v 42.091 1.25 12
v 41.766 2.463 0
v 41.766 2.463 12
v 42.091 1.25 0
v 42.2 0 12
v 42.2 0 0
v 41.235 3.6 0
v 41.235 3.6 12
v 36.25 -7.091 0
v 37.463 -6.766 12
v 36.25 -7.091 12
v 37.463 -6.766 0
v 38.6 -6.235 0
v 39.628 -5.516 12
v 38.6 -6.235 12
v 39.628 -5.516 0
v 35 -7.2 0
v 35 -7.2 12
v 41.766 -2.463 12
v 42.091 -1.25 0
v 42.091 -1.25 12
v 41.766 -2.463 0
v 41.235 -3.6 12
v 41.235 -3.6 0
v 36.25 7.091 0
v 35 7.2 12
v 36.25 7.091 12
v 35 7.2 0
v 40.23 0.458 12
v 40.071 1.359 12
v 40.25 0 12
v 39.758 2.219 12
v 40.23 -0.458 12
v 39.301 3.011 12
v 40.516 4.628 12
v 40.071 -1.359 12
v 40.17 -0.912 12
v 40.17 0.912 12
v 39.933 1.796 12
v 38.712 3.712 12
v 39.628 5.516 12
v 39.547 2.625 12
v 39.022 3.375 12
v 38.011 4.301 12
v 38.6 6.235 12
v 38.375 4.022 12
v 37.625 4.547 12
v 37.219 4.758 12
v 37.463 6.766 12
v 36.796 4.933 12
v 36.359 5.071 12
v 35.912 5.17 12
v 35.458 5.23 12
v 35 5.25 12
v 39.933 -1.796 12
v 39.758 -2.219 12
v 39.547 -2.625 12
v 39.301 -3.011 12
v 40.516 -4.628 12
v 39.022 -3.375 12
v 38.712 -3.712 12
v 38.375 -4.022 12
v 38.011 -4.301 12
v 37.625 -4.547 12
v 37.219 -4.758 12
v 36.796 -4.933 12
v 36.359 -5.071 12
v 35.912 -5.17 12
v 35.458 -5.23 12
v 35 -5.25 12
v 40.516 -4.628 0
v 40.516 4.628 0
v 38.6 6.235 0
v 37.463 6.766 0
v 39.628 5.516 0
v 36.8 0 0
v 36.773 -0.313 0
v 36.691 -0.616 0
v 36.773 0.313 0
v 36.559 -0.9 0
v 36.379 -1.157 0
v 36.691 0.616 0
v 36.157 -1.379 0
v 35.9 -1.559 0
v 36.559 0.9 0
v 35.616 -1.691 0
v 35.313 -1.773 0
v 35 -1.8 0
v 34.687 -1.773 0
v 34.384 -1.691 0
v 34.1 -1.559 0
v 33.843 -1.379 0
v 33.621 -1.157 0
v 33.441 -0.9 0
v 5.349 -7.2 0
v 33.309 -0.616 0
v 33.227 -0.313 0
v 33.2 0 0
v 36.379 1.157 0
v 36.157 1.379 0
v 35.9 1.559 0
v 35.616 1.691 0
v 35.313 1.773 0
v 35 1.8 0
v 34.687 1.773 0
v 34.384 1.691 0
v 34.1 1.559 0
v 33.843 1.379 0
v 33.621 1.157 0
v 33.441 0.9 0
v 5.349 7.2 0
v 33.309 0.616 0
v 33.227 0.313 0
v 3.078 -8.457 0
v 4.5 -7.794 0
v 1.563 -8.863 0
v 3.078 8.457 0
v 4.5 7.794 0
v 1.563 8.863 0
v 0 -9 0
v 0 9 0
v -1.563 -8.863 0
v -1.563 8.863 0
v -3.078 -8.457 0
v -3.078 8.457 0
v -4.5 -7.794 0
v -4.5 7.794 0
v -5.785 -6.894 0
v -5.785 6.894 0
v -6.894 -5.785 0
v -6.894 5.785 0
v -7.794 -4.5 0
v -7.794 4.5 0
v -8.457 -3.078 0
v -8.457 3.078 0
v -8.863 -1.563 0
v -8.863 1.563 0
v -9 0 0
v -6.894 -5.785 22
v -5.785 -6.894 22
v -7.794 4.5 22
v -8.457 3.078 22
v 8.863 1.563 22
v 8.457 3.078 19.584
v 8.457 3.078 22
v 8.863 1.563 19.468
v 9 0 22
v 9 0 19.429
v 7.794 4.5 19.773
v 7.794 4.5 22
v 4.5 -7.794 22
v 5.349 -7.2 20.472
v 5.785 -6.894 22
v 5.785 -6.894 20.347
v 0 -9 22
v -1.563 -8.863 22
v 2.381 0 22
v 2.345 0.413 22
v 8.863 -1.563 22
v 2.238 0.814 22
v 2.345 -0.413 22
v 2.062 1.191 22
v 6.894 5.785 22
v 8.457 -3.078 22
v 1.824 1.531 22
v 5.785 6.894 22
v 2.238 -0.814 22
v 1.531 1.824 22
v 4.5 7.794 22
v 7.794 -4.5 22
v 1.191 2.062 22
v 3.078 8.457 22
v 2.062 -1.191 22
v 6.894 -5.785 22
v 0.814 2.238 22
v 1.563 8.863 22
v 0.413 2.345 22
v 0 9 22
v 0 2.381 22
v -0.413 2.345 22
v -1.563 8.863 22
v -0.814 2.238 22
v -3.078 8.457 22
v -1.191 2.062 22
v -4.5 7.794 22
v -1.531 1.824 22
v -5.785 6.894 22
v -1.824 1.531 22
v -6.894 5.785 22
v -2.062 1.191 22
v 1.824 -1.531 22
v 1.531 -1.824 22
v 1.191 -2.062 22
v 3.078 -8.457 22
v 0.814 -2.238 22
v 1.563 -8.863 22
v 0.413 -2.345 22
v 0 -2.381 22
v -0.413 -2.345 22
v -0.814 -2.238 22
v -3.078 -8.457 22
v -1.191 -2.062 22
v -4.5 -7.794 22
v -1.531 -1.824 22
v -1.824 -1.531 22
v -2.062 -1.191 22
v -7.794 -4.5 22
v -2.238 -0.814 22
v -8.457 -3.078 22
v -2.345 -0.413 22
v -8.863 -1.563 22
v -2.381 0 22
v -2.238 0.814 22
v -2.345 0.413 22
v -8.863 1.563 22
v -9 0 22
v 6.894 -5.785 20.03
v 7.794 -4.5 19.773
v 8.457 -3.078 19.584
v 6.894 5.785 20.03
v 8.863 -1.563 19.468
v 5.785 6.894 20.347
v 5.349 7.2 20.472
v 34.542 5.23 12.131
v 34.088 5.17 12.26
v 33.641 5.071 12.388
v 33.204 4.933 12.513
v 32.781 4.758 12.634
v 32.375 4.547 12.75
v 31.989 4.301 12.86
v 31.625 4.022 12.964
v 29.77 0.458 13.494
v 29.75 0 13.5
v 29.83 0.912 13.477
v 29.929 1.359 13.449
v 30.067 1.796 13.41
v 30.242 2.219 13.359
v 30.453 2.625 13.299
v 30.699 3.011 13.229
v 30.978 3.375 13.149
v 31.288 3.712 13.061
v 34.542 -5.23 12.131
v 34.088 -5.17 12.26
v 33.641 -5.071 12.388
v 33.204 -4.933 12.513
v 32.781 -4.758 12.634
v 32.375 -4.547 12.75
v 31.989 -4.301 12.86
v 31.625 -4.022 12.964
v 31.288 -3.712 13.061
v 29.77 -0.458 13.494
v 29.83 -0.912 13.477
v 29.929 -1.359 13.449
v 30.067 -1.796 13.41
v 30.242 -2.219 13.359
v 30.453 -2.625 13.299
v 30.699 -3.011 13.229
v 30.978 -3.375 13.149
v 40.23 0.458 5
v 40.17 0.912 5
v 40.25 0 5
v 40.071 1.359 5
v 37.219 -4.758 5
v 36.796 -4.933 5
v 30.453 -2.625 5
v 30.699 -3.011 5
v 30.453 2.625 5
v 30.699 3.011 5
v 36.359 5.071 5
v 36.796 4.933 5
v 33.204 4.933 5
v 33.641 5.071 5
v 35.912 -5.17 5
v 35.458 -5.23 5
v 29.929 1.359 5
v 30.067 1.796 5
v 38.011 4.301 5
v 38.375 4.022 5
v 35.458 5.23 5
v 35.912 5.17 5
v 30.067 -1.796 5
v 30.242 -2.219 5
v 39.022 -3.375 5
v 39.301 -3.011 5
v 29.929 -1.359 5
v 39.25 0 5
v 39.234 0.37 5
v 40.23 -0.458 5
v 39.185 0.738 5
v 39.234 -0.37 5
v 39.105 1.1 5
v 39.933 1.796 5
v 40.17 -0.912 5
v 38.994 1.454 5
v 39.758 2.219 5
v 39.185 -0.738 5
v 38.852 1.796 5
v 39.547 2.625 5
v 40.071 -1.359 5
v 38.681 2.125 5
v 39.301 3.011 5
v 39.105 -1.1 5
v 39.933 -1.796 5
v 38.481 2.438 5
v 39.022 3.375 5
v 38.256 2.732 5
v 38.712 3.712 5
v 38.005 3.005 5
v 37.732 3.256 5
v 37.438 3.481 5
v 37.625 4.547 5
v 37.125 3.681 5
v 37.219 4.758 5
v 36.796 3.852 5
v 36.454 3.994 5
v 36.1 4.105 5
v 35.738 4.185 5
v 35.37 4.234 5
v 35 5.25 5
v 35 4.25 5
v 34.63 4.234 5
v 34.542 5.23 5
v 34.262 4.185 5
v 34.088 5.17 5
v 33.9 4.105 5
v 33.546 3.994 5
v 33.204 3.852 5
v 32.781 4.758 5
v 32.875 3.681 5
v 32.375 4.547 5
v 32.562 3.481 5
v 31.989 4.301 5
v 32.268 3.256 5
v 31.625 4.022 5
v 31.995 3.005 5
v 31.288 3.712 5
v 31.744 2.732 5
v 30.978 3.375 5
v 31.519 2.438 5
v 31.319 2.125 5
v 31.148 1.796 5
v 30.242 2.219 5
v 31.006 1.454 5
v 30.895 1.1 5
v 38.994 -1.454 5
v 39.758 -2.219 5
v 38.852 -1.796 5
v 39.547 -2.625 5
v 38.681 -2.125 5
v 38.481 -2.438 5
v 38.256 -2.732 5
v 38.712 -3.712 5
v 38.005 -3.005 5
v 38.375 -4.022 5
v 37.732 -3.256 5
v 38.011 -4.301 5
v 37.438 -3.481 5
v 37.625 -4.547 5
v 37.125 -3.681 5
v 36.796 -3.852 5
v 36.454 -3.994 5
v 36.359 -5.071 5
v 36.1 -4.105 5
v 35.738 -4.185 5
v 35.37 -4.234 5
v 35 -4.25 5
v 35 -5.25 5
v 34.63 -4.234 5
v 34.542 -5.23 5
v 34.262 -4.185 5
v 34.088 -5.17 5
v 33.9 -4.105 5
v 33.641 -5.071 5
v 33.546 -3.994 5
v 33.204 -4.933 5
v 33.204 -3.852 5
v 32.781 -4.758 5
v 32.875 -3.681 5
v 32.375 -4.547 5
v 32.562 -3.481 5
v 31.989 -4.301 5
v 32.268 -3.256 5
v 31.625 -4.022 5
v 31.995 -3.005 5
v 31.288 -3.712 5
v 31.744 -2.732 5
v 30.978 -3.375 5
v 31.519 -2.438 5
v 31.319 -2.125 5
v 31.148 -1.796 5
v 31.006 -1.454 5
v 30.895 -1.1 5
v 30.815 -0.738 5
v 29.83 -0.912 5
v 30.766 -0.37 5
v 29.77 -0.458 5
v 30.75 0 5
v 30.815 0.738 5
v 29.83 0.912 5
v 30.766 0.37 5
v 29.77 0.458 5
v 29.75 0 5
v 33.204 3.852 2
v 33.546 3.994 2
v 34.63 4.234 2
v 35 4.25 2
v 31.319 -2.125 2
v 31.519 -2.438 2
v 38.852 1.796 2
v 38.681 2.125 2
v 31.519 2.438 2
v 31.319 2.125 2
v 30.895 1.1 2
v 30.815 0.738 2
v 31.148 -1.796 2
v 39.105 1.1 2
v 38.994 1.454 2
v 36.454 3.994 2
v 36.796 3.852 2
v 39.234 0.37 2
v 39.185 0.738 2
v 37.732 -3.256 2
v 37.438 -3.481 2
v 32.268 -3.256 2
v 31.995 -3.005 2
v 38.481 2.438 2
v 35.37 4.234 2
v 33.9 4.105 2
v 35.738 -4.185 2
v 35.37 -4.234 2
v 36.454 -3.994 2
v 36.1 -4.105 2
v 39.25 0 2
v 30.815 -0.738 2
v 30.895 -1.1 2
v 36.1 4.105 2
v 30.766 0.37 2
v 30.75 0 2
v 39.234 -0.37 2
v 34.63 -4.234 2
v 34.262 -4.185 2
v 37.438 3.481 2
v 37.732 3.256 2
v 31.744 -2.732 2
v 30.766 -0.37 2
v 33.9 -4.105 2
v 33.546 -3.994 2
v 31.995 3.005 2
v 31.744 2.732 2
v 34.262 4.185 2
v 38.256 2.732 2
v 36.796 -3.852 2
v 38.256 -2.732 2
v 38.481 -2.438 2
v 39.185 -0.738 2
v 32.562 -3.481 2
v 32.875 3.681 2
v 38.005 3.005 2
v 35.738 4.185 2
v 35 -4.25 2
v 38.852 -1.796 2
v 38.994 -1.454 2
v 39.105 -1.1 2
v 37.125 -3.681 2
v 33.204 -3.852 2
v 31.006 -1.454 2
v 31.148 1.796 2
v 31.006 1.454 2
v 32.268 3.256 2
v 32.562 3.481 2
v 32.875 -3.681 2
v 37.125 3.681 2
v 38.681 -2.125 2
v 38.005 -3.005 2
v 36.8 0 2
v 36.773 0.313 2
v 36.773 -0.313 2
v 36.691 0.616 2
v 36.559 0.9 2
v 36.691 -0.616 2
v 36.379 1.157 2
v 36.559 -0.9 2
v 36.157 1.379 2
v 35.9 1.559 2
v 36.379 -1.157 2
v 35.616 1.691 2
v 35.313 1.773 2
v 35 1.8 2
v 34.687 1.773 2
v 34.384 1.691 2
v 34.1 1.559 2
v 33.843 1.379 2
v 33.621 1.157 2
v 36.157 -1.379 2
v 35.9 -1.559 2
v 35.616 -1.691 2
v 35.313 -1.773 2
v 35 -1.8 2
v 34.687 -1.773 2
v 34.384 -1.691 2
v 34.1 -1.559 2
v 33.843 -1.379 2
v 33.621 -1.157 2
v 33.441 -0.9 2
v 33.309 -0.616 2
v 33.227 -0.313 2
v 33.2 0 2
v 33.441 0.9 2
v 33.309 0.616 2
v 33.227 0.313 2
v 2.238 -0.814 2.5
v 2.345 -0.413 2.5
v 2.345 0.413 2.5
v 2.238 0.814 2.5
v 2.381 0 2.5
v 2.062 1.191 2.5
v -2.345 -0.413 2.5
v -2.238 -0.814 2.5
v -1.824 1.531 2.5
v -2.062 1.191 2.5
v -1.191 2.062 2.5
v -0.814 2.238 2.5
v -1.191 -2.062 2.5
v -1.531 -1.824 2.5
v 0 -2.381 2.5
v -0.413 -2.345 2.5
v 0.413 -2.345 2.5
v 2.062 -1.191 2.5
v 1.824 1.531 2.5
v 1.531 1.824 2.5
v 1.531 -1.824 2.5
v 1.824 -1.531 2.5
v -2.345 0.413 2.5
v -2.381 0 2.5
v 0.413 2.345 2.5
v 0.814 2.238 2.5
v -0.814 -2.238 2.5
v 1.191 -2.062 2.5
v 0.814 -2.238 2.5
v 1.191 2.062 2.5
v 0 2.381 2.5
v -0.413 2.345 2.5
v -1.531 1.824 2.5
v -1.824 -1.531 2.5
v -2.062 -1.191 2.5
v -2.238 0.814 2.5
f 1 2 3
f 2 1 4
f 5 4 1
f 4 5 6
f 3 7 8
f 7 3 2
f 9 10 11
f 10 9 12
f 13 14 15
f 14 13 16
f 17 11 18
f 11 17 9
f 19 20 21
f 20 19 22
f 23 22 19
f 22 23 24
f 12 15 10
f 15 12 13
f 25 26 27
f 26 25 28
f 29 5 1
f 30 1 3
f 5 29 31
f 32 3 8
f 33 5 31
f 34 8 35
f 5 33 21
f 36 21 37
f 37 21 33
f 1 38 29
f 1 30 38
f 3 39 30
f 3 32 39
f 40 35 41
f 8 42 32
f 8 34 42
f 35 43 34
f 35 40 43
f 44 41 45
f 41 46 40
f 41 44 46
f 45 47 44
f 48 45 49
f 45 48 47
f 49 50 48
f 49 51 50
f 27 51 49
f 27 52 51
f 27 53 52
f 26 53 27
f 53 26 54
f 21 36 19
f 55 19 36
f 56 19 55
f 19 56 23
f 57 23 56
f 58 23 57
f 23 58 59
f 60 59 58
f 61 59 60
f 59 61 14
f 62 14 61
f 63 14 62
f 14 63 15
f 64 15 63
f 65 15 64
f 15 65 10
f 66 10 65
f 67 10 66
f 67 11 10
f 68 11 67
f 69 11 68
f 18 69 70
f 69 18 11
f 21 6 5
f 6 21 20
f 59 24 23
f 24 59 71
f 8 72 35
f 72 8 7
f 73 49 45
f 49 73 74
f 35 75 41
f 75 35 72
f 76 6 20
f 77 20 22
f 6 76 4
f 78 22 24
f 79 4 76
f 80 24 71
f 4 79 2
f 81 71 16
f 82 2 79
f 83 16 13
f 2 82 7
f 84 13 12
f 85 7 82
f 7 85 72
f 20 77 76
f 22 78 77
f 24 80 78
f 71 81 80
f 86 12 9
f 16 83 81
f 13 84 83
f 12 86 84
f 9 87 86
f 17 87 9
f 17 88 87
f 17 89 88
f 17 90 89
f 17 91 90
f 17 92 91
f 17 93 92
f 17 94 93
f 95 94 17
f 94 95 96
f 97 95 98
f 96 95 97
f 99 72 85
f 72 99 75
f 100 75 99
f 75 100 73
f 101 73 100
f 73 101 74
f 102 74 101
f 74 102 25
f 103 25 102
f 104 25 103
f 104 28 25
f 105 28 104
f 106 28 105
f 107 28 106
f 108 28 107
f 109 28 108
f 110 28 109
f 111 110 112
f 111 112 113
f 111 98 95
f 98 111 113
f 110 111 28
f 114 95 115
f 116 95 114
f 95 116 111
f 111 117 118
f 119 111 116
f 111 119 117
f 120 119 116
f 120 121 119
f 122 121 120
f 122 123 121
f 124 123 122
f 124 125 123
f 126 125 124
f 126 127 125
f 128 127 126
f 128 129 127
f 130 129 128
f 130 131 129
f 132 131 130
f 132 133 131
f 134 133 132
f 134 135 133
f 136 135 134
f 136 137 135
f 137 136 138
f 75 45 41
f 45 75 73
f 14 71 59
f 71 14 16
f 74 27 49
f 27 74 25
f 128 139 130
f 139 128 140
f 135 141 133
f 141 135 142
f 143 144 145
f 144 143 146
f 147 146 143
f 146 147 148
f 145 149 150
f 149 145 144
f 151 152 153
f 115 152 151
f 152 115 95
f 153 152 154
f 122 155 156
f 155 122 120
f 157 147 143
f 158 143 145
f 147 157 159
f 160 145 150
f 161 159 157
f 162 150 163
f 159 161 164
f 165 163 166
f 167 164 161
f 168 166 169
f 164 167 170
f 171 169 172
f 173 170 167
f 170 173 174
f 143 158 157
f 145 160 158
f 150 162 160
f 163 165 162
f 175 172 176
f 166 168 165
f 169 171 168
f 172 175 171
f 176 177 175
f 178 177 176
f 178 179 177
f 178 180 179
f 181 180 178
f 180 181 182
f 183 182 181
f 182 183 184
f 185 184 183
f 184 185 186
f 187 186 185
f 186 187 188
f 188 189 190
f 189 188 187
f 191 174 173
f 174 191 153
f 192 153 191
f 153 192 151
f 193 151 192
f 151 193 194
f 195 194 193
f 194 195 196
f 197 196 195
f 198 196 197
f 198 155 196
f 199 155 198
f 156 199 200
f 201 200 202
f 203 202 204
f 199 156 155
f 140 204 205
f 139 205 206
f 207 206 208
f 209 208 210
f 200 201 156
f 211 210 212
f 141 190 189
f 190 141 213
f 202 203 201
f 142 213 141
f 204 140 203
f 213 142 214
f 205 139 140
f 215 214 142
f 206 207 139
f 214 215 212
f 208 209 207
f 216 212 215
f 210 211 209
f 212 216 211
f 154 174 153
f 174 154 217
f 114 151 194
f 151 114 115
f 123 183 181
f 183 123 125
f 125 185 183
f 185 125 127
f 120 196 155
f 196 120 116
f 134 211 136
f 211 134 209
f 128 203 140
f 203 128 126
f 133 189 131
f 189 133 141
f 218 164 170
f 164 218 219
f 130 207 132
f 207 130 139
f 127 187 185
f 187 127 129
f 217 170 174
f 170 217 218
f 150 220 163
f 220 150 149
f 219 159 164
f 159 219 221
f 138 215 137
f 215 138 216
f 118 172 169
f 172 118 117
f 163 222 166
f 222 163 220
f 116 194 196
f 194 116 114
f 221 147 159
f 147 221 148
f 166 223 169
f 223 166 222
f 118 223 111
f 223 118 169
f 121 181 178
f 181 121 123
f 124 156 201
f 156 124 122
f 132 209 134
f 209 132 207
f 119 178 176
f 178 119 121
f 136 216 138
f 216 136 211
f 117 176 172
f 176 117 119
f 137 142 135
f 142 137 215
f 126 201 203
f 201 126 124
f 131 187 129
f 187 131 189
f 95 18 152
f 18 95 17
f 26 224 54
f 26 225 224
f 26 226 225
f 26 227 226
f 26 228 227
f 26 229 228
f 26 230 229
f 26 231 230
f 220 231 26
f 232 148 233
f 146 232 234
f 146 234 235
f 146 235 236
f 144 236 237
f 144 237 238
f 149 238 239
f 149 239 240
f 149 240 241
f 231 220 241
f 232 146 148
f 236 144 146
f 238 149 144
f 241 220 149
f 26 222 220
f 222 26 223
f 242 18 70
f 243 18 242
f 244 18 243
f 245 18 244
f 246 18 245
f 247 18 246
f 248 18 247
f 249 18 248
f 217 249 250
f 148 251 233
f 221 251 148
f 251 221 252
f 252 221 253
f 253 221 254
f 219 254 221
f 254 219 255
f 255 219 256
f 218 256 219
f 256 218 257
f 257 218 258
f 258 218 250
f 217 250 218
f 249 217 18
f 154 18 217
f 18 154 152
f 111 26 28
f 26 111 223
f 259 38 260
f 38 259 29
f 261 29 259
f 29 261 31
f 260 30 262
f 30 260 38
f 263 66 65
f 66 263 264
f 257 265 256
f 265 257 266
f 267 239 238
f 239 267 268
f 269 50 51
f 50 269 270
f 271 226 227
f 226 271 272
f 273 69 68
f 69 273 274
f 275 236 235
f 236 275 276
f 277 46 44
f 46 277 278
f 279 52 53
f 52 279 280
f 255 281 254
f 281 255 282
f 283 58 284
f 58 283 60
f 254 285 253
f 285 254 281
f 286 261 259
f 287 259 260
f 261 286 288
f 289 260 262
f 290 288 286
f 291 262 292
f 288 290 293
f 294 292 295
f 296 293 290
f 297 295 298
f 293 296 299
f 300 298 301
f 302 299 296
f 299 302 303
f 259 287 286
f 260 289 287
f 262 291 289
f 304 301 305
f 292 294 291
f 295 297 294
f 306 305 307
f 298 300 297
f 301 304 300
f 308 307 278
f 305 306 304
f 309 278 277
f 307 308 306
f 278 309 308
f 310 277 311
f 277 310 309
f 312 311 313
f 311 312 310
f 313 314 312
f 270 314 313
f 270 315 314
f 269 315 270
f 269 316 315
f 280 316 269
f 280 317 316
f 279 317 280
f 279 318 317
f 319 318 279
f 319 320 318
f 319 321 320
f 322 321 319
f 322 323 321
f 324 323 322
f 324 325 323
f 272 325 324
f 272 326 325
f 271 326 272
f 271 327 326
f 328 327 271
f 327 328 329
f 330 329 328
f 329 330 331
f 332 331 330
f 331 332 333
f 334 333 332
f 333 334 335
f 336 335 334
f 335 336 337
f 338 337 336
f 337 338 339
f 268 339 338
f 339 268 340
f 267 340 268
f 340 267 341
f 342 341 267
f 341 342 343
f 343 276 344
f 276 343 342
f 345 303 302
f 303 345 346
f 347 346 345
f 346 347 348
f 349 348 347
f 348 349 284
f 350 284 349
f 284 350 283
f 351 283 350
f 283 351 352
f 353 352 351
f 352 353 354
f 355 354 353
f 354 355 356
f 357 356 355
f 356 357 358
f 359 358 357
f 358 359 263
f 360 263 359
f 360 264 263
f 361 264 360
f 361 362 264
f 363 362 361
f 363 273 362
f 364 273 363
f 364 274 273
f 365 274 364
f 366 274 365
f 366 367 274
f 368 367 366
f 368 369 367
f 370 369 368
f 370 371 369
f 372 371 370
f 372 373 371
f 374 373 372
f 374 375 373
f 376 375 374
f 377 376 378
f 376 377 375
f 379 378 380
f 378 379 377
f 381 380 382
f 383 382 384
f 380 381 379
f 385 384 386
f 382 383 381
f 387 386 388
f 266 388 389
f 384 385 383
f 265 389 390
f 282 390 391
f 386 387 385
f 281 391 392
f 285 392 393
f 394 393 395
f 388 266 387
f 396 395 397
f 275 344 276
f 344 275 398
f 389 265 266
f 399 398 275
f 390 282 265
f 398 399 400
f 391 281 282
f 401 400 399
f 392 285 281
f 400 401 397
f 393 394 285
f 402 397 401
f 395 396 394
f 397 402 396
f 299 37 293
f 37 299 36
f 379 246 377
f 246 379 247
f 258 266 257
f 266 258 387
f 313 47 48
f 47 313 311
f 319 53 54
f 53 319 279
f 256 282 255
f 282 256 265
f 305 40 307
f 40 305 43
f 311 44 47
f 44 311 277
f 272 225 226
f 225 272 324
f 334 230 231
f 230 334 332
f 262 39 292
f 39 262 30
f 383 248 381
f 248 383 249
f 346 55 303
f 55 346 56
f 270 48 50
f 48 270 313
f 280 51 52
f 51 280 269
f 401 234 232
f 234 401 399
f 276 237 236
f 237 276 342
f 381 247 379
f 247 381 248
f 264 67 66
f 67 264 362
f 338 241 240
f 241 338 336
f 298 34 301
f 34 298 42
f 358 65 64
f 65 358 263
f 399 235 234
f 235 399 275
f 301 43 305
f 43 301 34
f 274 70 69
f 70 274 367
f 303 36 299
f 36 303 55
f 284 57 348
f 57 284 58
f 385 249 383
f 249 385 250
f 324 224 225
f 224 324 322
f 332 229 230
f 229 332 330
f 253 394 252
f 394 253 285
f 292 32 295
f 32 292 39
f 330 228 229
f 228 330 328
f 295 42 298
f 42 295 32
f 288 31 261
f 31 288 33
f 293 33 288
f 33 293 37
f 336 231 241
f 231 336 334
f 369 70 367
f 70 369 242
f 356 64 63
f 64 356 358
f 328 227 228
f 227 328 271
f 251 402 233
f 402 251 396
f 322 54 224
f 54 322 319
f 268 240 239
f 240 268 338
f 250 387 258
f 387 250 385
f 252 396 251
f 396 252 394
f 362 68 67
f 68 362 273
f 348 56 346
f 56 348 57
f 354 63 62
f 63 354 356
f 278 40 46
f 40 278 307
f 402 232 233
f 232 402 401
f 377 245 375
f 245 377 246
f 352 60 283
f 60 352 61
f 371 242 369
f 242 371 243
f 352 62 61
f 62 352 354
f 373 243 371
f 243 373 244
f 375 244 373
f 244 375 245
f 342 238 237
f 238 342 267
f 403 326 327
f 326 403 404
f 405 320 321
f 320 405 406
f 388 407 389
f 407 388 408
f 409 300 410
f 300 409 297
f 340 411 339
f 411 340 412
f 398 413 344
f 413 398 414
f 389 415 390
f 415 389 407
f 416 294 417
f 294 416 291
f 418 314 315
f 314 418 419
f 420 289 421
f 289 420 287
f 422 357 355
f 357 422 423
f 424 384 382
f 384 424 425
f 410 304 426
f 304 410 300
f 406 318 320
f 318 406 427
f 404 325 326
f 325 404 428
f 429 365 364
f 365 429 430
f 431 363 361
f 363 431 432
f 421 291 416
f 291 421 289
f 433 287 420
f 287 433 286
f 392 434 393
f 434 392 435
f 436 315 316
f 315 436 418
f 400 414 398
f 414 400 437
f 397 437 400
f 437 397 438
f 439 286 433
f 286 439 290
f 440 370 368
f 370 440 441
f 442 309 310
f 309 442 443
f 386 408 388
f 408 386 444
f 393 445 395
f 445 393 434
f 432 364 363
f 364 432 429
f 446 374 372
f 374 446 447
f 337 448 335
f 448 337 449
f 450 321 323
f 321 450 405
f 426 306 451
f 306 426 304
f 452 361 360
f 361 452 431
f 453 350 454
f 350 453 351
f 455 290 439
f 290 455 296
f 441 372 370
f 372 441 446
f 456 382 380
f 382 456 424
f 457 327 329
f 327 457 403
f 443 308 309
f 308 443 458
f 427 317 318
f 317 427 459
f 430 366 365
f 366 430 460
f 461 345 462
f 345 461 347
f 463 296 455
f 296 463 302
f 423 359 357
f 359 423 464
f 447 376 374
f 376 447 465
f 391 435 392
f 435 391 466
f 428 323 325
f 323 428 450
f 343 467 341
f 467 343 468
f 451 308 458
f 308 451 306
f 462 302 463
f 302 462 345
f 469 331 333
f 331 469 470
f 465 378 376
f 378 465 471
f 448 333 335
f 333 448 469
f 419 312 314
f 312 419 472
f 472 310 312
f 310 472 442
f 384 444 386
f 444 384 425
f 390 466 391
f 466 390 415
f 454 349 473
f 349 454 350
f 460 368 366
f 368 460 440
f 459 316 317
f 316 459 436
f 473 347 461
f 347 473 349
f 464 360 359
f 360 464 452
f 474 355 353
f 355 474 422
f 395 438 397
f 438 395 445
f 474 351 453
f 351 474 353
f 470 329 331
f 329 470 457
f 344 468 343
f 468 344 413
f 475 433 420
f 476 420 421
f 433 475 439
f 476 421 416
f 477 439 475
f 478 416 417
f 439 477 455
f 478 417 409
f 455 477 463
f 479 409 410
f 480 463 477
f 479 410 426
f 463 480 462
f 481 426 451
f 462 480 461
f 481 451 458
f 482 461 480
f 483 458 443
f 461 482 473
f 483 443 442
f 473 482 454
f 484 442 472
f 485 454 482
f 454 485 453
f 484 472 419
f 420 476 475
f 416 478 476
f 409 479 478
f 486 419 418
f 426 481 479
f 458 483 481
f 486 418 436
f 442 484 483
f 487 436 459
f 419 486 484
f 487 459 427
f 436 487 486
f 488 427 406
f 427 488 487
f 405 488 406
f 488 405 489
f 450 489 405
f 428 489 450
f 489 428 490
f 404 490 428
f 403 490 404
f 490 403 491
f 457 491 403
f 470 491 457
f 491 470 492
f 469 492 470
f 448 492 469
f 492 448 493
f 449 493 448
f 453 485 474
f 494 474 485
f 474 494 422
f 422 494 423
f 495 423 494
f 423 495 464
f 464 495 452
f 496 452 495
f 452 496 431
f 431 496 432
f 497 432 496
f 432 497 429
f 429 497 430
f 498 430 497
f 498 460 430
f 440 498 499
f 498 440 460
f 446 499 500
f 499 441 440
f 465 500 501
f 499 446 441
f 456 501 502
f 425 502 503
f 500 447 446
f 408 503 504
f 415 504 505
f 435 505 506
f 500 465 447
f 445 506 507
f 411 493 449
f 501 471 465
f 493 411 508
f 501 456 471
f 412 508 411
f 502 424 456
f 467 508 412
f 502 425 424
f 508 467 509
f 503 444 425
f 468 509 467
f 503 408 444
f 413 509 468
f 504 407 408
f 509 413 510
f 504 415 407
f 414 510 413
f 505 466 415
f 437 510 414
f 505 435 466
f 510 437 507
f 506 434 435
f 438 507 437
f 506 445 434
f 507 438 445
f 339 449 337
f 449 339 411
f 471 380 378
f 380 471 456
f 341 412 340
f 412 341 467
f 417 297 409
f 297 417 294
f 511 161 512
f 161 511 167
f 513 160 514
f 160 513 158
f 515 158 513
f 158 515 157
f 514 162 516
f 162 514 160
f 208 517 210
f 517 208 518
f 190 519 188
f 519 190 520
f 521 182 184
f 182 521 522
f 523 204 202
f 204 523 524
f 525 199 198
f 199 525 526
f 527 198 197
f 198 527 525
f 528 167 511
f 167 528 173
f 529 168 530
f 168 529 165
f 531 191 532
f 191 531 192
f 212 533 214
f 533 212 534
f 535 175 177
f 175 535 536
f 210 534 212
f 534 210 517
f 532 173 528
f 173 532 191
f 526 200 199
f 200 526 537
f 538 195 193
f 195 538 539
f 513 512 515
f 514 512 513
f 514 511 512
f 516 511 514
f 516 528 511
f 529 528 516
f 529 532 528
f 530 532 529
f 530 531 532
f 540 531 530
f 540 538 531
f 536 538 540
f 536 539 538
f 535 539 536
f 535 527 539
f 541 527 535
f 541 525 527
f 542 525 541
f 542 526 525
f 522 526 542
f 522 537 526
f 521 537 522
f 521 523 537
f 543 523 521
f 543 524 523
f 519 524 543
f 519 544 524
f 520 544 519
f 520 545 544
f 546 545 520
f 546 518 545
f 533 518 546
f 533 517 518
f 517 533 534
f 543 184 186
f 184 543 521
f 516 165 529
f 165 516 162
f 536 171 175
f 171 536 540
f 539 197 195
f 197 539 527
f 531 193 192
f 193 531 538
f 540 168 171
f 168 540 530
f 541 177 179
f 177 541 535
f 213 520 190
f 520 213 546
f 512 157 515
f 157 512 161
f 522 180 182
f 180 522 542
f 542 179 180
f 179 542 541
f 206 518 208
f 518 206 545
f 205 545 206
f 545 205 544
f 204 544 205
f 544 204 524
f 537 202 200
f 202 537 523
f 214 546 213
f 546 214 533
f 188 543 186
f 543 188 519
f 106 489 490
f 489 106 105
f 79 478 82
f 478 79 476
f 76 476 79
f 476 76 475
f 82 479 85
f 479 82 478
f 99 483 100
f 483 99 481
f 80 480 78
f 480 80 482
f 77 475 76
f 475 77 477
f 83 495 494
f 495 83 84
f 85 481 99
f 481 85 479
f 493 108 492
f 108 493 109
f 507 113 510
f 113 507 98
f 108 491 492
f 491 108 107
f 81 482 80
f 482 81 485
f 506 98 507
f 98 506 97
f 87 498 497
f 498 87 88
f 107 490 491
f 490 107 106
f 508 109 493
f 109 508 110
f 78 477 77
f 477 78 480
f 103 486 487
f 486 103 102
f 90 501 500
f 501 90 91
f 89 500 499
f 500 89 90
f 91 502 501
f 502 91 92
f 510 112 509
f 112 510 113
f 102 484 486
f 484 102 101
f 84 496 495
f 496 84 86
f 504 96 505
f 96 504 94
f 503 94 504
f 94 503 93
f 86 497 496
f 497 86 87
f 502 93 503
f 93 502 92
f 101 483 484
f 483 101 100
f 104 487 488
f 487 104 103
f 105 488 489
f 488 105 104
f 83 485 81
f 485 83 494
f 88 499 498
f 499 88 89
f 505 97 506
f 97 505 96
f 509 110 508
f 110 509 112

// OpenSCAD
handle_hub_diameter=18;
handle_shaft_diameter=3/16*25.4;
handle_shaft_length=22;

handle_length=35;

handle_end_diameter=14.4;
handle_end_length=12;

overlap=0.1;

$fn=36;


handle();
//knob();

module handle()
{
	difference()
	{
		union ()
		{
			translate([handle_length,0,0])
			cylinder(r=handle_end_diameter/2,h=handle_end_length);
			cylinder(r=handle_hub_diameter/2,h=handle_shaft_length);
			
			rotate([90,0,0])
			linear_extrude (height=handle_end_diameter, convexity=2,center=true) 
			{
			polygon (points=[
					[0,0],
					[handle_length,0],
					[handle_length,handle_end_length],
					[0,handle_shaft_length]],
				paths=[[0,1,2,3,0]]);
			}
		}
	
		translate([0,0,2.5])
		cylinder(r=handle_shaft_diameter/2,h=handle_shaft_length);
		
		translate([handle_length,0,-overlap])
		cylinder(r=1.8,h=handle_end_length);
	
		translate ([handle_length,0,2]) 
		{
			translate ([0,0,3]) 
			cylinder(r=5+0.25,h=10,$fn=72);
			cylinder(r=5-0.75,h=6.5,$fn=72);
		}
	}
}

module knob()
{
	difference()
	{
		cylinder(r1=14/2,r2=10/2,h=22);
		translate([0,0,3])
		cylinder(r=3.5/2,h=22);
	}
}
